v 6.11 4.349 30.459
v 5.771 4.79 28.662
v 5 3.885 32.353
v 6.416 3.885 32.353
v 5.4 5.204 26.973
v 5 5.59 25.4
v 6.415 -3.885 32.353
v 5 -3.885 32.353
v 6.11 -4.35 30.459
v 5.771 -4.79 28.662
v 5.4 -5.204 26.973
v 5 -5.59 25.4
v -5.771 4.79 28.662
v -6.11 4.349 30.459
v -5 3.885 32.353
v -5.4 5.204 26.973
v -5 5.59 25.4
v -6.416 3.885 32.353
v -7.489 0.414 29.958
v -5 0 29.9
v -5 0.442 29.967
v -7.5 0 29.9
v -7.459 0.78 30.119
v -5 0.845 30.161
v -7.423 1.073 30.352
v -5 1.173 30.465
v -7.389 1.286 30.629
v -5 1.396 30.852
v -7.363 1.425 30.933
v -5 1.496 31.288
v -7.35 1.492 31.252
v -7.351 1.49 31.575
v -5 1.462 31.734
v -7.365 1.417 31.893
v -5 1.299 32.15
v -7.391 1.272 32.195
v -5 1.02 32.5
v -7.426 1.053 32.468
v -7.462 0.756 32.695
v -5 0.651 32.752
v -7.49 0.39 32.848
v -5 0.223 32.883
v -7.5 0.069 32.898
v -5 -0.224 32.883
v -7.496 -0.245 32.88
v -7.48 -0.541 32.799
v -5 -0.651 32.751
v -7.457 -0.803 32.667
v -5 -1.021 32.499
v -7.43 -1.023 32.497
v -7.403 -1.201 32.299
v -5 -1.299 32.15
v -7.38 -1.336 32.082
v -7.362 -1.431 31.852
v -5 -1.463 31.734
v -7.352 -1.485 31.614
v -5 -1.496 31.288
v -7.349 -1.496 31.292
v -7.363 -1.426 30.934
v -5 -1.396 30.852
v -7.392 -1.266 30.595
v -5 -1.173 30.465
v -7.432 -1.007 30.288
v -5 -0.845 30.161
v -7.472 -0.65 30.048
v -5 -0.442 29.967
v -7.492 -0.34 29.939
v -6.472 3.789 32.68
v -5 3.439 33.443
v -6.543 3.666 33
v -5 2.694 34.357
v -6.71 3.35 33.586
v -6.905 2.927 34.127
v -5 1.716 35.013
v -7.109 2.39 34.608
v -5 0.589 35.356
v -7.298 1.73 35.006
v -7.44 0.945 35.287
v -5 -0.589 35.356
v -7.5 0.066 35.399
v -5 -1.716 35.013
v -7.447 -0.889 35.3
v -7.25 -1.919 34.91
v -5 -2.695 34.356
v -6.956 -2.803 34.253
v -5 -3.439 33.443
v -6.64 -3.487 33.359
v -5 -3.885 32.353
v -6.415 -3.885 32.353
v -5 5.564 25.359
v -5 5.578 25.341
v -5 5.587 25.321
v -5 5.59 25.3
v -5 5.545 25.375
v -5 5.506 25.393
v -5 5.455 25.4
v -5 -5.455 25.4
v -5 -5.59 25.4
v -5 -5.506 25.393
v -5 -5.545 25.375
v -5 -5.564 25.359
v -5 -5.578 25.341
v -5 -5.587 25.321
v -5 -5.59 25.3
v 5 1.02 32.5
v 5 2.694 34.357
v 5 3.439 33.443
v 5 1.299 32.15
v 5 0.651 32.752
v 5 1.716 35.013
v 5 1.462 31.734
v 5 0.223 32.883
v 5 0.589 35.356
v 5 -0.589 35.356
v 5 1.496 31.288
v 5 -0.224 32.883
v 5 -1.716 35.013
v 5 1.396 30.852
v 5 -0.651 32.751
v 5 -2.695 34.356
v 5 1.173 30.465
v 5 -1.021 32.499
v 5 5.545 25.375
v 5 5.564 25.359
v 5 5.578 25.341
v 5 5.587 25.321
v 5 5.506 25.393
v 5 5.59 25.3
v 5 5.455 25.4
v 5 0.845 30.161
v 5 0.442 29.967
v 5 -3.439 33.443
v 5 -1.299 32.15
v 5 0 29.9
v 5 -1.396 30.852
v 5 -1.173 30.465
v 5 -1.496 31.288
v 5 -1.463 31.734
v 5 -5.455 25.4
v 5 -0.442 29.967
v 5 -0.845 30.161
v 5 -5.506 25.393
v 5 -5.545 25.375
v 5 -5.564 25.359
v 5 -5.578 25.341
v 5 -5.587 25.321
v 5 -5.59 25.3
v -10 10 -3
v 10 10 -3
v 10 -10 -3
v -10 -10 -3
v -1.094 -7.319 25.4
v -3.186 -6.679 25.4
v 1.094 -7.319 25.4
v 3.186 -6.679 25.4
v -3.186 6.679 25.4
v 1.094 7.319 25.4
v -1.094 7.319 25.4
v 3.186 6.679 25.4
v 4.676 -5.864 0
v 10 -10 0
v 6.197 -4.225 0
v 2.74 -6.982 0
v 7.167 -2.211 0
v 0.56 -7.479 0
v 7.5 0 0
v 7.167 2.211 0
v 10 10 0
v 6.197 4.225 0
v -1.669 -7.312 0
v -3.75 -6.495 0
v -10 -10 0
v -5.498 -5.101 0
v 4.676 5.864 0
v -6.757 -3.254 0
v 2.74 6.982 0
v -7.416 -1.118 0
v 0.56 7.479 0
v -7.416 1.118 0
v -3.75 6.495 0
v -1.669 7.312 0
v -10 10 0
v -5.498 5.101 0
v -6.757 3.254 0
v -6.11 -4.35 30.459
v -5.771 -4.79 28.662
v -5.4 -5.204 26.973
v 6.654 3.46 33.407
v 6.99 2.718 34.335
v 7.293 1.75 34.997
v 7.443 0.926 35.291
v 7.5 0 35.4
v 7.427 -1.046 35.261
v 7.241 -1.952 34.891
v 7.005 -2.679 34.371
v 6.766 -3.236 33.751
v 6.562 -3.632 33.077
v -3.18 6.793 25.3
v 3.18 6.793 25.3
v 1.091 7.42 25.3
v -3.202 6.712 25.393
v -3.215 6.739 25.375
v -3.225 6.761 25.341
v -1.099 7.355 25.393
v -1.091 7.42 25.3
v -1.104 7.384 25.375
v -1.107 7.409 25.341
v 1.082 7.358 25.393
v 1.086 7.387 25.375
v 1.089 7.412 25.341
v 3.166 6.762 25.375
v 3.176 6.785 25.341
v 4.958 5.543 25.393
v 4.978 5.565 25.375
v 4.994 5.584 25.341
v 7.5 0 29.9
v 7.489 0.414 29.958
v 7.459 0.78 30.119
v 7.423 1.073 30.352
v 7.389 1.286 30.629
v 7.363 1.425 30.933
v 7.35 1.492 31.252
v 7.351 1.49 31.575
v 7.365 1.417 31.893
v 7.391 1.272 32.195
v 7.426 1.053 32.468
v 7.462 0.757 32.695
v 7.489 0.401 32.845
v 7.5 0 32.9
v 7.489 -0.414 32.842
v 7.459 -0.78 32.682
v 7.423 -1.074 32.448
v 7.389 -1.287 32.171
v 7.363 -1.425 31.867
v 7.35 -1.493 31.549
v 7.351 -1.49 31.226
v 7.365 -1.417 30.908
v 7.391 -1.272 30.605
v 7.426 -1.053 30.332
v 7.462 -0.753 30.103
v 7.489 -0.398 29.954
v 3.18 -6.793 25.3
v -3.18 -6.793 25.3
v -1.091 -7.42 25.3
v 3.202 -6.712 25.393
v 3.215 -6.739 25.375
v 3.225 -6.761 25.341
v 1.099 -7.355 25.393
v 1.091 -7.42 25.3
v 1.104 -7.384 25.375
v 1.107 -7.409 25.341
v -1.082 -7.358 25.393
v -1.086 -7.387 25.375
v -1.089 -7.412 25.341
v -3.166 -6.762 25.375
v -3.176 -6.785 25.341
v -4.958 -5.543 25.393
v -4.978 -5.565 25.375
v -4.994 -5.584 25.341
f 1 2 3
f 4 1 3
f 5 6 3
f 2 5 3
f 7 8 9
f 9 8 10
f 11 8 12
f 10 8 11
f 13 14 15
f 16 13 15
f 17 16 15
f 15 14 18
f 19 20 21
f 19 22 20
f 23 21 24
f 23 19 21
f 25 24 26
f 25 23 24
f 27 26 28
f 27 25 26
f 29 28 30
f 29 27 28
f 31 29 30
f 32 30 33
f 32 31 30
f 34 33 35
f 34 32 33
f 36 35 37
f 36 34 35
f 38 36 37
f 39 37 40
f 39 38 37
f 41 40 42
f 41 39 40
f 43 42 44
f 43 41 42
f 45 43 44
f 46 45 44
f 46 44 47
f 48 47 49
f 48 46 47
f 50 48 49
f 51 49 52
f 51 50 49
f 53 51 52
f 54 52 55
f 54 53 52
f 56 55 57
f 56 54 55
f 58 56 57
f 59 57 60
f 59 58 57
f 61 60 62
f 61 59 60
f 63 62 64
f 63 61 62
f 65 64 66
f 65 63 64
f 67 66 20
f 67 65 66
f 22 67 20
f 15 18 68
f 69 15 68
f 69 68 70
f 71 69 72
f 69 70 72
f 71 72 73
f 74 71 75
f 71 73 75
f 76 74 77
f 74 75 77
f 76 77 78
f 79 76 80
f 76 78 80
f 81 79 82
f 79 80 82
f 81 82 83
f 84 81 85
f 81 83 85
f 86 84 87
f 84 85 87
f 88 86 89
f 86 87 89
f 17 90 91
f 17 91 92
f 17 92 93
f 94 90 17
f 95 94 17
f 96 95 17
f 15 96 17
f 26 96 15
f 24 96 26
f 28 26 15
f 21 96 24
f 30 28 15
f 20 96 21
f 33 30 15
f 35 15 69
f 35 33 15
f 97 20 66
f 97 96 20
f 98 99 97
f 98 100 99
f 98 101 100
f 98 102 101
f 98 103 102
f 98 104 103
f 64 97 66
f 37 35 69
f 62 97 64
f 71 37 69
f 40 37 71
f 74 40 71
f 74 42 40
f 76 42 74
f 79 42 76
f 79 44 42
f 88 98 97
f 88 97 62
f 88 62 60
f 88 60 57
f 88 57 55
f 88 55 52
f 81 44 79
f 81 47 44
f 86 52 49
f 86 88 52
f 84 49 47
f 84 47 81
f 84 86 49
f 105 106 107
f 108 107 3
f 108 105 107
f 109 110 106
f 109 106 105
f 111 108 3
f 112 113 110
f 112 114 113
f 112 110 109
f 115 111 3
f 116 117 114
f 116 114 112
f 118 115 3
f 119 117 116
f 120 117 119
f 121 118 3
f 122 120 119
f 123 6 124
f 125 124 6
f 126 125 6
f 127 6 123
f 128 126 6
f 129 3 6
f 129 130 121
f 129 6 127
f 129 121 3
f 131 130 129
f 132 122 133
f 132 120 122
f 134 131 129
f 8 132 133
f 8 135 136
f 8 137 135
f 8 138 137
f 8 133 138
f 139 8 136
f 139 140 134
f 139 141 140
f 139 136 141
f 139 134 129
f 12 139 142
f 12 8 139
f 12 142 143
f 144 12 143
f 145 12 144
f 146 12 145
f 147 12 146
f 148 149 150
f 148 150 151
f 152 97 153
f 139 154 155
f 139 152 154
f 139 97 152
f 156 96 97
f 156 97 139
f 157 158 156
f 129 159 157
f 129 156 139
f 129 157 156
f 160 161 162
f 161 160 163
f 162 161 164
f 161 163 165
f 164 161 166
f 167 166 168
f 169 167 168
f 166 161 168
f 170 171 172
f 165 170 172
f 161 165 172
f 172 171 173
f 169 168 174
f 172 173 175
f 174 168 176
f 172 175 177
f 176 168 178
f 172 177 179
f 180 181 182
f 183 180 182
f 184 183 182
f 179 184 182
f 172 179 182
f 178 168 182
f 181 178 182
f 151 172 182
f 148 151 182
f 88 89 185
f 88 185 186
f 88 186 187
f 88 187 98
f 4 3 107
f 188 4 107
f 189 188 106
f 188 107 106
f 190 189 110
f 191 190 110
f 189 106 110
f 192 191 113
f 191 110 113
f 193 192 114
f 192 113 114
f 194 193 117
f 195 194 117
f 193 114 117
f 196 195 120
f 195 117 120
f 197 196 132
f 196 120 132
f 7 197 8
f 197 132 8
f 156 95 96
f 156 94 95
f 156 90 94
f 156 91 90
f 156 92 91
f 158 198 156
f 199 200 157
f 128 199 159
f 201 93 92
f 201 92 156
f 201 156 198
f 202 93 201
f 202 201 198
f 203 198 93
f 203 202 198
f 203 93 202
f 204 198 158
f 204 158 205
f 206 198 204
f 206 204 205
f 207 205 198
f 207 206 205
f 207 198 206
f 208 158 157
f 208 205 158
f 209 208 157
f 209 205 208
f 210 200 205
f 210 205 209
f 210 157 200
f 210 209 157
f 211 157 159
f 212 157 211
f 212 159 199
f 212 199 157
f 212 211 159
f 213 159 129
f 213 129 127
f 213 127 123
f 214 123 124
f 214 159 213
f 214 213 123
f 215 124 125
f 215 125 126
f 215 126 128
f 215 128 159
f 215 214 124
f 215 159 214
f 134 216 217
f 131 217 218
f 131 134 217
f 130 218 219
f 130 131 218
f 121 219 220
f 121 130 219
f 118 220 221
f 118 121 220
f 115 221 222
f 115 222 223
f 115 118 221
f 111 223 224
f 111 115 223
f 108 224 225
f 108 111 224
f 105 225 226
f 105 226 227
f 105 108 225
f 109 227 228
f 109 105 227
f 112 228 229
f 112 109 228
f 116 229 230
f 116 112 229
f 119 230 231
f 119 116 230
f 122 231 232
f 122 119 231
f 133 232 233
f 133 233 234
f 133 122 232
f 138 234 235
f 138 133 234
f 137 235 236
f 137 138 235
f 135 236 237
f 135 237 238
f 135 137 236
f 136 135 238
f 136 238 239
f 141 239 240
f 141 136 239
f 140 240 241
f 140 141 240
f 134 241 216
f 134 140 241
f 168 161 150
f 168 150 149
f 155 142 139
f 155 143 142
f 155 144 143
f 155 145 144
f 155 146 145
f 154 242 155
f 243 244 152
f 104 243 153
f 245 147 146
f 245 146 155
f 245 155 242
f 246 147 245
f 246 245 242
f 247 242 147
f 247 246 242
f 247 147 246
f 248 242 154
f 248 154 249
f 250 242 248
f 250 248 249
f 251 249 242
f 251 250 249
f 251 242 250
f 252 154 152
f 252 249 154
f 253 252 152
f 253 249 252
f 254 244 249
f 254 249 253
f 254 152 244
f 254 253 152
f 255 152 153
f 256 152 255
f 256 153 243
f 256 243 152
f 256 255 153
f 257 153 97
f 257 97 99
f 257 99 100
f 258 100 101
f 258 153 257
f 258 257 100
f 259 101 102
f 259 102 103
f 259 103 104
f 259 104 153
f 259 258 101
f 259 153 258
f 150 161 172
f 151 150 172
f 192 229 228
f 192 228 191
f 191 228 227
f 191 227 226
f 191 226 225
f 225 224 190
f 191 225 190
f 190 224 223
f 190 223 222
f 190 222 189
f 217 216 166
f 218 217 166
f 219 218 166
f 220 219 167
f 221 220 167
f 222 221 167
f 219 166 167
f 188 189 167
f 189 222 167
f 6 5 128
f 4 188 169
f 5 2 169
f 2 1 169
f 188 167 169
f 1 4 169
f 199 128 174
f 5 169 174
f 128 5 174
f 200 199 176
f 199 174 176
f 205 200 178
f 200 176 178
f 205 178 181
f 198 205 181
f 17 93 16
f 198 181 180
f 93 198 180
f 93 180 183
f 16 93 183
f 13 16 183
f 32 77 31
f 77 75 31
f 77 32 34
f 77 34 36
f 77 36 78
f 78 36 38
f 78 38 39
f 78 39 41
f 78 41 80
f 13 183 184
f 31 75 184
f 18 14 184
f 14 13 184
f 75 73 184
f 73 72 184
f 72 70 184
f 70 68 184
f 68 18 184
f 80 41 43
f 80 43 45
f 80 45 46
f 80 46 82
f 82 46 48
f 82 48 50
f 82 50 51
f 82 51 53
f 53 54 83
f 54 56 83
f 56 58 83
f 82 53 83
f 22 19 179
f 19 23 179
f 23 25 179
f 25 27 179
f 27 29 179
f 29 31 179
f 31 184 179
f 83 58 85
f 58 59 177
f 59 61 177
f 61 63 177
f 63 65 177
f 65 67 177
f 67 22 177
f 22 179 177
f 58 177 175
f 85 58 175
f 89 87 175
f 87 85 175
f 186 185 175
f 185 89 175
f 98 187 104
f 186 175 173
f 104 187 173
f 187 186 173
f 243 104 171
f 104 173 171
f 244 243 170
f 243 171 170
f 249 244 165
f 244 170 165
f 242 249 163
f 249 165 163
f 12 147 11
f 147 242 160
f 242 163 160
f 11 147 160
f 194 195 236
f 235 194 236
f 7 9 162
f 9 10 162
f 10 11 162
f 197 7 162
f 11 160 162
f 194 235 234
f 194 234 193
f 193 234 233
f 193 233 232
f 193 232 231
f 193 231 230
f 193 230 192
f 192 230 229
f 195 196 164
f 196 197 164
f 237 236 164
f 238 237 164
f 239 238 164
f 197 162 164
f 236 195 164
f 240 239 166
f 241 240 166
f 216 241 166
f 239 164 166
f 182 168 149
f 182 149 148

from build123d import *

# Parameters (mm, degrees)
SKETCH1_R               = 7.5
BOSS_EXTRUDE1_DEPTH     = 35.4
SKETCH3_W               = 10
SKETCH3_H               = 16
CUT_EXTRUDE2_DEPTH      = 10
CUT_EXTRUDE3_DEPTH      = 37.954837302
CUT_EXTRUDE3_DEPTH_BACK = 37.954837302
CUT_EXTRUDE4_DEPTH      = 37.954837438
CUT_EXTRUDE4_DEPTH_BACK = 37.954837438
SKETCH5_R               = 1.5
FILLET1_R               = 0.1
SKETCH6_W               = 20
SKETCH6_H               = 20
BOSS_EXTRUDE2_DEPTH     = 3


with BuildPart() as part:
    # Sketch1 → Boss-Extrude1 (new body)
    with BuildSketch(Plane.XY):
        Circle(SKETCH1_R)
    extrude(amount=BOSS_EXTRUDE1_DEPTH)

    # Sketch3 → Cut-Extrude2 (cut)
    with BuildSketch(Plane.XY.offset(35.4)):
        Rectangle(SKETCH3_W, SKETCH3_H)
    extrude(amount=-CUT_EXTRUDE2_DEPTH, mode=Mode.SUBTRACT)

    # Sketch4 → Cut-Extrude3 (cut, two sides: drawn at the far end of the back side and taken through both)
    with BuildSketch(Plane(origin=(0, 0, 0), x_dir=(0, 0, -1), z_dir=(1, 0, 0)).offset(-CUT_EXTRUDE3_DEPTH_BACK)):
        with BuildLine():
            Line((-25.4, 76.496949074), (-25.4, 7.5))
            Line((-25.4, 7.5), (-25.4, 5.590169944))
            Line((-25.4, 5.590169944), (-32.352923855, 3.884664175))
            ThreePointArc((-32.352923855, 3.884664175), (-35.399999999, -0.000262165), (-32.352744721, -3.885047998))
            Line((-32.352744721, -3.885047998), (-25.4, -5.590169944))
            Line((-25.4, -5.590169944), (-25.4, -7.5))
            Line((-25.4, -7.5), (-25.4, -76.496949074))
            Line((-25.4, -76.496949074), (-163.393898147, -76.496949074))
            Line((-163.393898147, -76.496949074), (-163.393898147, 76.496949074))
            Line((-163.393898147, 76.496949074), (-25.4, 76.496949074))
        make_face()
    extrude(amount=CUT_EXTRUDE3_DEPTH + CUT_EXTRUDE3_DEPTH_BACK, mode=Mode.SUBTRACT)

    # Sketch5 → Cut-Extrude4 (cut, two sides: drawn at the far end of the back side and taken through both)
    with BuildSketch(Plane(origin=(0, 0, 0), x_dir=(0, 0, -1), z_dir=(1, 0, 0)).offset(-CUT_EXTRUDE4_DEPTH_BACK)):
        with Locations(Location((-31.4, -0.000169944, 0), (0, 0, 0.006491373))):
            Circle(SKETCH5_R)
    extrude(amount=CUT_EXTRUDE4_DEPTH + CUT_EXTRUDE4_DEPTH_BACK, mode=Mode.SUBTRACT)

    # Fillet1
    # the kernel refuses this fillet: 0.1 mm, written as the material it takes off along each edge
    with BuildSketch(Plane(origin=(0, 0, 25.4), x_dir=(0.6911452834399253, -0.7227158481580055, 0), z_dir=(0.7227158481580055, 0.6911452834399253, 0))) as fillet1_piece_1_section:
        with BuildLine():
            CenterArc((7.5 - FILLET1_R, FILLET1_R), FILLET1_R, 270, 90)
            Line((7.5 - FILLET1_R, 0), (7.5, 0))
            Line((7.5, 0), (7.5, FILLET1_R))
        make_face()
    fillet1_piece_1 = revolve(axis=Axis((0, 0, 25.4), (0, 0, -1)), revolution_arc=87.441672972, mode=Mode.PRIVATE)
    fillet1_piece_1 = split(fillet1_piece_1, bisect_by=Plane(origin=(5, -5.569278589, 25.383070115), z_dir=(-1, 0, 0)), keep=Keep.TOP, mode=Mode.PRIVATE)
    fillet1_piece_1 = split(fillet1_piece_1, bisect_by=Plane(origin=(-5, -5.569278589, 25.383070115), z_dir=(1, 0, 0)), keep=Keep.TOP, mode=Mode.PRIVATE)
    add(fillet1_piece_1, mode=Mode.SUBTRACT)
    with BuildSketch(Plane(origin=(0, 0, 25.4), x_dir=(-0.6911452834399255, 0.7227158481580054, 0), z_dir=(-0.7227158481580054, -0.6911452834399255, 0))) as fillet1_piece_2_section:
        with BuildLine():
            CenterArc((7.5 - FILLET1_R, FILLET1_R), FILLET1_R, 270, 90)
            Line((7.5 - FILLET1_R, 0), (7.5, 0))
            Line((7.5, 0), (7.5, FILLET1_R))
        make_face()
    fillet1_piece_2 = revolve(axis=Axis((0, 0, 25.4), (0, 0, -1)), revolution_arc=87.441672972, mode=Mode.PRIVATE)
    fillet1_piece_2 = split(fillet1_piece_2, bisect_by=Plane(origin=(5, 5.569279486, 25.383069507), z_dir=(-1, 0, 0)), keep=Keep.TOP, mode=Mode.PRIVATE)
    fillet1_piece_2 = split(fillet1_piece_2, bisect_by=Plane(origin=(-5, 5.569279486, 25.383069507), z_dir=(1, 0, 0)), keep=Keep.TOP, mode=Mode.PRIVATE)
    add(fillet1_piece_2, mode=Mode.SUBTRACT)

    # Sketch6 → Boss-Extrude2 (add)
    with BuildSketch(Plane(origin=(0, 0, 0), x_dir=(-1, 0, 0), z_dir=(0, 0, -1))):
        Rectangle(SKETCH6_W, SKETCH6_H)
    extrude(amount=BOSS_EXTRUDE2_DEPTH)


solid = part.part
